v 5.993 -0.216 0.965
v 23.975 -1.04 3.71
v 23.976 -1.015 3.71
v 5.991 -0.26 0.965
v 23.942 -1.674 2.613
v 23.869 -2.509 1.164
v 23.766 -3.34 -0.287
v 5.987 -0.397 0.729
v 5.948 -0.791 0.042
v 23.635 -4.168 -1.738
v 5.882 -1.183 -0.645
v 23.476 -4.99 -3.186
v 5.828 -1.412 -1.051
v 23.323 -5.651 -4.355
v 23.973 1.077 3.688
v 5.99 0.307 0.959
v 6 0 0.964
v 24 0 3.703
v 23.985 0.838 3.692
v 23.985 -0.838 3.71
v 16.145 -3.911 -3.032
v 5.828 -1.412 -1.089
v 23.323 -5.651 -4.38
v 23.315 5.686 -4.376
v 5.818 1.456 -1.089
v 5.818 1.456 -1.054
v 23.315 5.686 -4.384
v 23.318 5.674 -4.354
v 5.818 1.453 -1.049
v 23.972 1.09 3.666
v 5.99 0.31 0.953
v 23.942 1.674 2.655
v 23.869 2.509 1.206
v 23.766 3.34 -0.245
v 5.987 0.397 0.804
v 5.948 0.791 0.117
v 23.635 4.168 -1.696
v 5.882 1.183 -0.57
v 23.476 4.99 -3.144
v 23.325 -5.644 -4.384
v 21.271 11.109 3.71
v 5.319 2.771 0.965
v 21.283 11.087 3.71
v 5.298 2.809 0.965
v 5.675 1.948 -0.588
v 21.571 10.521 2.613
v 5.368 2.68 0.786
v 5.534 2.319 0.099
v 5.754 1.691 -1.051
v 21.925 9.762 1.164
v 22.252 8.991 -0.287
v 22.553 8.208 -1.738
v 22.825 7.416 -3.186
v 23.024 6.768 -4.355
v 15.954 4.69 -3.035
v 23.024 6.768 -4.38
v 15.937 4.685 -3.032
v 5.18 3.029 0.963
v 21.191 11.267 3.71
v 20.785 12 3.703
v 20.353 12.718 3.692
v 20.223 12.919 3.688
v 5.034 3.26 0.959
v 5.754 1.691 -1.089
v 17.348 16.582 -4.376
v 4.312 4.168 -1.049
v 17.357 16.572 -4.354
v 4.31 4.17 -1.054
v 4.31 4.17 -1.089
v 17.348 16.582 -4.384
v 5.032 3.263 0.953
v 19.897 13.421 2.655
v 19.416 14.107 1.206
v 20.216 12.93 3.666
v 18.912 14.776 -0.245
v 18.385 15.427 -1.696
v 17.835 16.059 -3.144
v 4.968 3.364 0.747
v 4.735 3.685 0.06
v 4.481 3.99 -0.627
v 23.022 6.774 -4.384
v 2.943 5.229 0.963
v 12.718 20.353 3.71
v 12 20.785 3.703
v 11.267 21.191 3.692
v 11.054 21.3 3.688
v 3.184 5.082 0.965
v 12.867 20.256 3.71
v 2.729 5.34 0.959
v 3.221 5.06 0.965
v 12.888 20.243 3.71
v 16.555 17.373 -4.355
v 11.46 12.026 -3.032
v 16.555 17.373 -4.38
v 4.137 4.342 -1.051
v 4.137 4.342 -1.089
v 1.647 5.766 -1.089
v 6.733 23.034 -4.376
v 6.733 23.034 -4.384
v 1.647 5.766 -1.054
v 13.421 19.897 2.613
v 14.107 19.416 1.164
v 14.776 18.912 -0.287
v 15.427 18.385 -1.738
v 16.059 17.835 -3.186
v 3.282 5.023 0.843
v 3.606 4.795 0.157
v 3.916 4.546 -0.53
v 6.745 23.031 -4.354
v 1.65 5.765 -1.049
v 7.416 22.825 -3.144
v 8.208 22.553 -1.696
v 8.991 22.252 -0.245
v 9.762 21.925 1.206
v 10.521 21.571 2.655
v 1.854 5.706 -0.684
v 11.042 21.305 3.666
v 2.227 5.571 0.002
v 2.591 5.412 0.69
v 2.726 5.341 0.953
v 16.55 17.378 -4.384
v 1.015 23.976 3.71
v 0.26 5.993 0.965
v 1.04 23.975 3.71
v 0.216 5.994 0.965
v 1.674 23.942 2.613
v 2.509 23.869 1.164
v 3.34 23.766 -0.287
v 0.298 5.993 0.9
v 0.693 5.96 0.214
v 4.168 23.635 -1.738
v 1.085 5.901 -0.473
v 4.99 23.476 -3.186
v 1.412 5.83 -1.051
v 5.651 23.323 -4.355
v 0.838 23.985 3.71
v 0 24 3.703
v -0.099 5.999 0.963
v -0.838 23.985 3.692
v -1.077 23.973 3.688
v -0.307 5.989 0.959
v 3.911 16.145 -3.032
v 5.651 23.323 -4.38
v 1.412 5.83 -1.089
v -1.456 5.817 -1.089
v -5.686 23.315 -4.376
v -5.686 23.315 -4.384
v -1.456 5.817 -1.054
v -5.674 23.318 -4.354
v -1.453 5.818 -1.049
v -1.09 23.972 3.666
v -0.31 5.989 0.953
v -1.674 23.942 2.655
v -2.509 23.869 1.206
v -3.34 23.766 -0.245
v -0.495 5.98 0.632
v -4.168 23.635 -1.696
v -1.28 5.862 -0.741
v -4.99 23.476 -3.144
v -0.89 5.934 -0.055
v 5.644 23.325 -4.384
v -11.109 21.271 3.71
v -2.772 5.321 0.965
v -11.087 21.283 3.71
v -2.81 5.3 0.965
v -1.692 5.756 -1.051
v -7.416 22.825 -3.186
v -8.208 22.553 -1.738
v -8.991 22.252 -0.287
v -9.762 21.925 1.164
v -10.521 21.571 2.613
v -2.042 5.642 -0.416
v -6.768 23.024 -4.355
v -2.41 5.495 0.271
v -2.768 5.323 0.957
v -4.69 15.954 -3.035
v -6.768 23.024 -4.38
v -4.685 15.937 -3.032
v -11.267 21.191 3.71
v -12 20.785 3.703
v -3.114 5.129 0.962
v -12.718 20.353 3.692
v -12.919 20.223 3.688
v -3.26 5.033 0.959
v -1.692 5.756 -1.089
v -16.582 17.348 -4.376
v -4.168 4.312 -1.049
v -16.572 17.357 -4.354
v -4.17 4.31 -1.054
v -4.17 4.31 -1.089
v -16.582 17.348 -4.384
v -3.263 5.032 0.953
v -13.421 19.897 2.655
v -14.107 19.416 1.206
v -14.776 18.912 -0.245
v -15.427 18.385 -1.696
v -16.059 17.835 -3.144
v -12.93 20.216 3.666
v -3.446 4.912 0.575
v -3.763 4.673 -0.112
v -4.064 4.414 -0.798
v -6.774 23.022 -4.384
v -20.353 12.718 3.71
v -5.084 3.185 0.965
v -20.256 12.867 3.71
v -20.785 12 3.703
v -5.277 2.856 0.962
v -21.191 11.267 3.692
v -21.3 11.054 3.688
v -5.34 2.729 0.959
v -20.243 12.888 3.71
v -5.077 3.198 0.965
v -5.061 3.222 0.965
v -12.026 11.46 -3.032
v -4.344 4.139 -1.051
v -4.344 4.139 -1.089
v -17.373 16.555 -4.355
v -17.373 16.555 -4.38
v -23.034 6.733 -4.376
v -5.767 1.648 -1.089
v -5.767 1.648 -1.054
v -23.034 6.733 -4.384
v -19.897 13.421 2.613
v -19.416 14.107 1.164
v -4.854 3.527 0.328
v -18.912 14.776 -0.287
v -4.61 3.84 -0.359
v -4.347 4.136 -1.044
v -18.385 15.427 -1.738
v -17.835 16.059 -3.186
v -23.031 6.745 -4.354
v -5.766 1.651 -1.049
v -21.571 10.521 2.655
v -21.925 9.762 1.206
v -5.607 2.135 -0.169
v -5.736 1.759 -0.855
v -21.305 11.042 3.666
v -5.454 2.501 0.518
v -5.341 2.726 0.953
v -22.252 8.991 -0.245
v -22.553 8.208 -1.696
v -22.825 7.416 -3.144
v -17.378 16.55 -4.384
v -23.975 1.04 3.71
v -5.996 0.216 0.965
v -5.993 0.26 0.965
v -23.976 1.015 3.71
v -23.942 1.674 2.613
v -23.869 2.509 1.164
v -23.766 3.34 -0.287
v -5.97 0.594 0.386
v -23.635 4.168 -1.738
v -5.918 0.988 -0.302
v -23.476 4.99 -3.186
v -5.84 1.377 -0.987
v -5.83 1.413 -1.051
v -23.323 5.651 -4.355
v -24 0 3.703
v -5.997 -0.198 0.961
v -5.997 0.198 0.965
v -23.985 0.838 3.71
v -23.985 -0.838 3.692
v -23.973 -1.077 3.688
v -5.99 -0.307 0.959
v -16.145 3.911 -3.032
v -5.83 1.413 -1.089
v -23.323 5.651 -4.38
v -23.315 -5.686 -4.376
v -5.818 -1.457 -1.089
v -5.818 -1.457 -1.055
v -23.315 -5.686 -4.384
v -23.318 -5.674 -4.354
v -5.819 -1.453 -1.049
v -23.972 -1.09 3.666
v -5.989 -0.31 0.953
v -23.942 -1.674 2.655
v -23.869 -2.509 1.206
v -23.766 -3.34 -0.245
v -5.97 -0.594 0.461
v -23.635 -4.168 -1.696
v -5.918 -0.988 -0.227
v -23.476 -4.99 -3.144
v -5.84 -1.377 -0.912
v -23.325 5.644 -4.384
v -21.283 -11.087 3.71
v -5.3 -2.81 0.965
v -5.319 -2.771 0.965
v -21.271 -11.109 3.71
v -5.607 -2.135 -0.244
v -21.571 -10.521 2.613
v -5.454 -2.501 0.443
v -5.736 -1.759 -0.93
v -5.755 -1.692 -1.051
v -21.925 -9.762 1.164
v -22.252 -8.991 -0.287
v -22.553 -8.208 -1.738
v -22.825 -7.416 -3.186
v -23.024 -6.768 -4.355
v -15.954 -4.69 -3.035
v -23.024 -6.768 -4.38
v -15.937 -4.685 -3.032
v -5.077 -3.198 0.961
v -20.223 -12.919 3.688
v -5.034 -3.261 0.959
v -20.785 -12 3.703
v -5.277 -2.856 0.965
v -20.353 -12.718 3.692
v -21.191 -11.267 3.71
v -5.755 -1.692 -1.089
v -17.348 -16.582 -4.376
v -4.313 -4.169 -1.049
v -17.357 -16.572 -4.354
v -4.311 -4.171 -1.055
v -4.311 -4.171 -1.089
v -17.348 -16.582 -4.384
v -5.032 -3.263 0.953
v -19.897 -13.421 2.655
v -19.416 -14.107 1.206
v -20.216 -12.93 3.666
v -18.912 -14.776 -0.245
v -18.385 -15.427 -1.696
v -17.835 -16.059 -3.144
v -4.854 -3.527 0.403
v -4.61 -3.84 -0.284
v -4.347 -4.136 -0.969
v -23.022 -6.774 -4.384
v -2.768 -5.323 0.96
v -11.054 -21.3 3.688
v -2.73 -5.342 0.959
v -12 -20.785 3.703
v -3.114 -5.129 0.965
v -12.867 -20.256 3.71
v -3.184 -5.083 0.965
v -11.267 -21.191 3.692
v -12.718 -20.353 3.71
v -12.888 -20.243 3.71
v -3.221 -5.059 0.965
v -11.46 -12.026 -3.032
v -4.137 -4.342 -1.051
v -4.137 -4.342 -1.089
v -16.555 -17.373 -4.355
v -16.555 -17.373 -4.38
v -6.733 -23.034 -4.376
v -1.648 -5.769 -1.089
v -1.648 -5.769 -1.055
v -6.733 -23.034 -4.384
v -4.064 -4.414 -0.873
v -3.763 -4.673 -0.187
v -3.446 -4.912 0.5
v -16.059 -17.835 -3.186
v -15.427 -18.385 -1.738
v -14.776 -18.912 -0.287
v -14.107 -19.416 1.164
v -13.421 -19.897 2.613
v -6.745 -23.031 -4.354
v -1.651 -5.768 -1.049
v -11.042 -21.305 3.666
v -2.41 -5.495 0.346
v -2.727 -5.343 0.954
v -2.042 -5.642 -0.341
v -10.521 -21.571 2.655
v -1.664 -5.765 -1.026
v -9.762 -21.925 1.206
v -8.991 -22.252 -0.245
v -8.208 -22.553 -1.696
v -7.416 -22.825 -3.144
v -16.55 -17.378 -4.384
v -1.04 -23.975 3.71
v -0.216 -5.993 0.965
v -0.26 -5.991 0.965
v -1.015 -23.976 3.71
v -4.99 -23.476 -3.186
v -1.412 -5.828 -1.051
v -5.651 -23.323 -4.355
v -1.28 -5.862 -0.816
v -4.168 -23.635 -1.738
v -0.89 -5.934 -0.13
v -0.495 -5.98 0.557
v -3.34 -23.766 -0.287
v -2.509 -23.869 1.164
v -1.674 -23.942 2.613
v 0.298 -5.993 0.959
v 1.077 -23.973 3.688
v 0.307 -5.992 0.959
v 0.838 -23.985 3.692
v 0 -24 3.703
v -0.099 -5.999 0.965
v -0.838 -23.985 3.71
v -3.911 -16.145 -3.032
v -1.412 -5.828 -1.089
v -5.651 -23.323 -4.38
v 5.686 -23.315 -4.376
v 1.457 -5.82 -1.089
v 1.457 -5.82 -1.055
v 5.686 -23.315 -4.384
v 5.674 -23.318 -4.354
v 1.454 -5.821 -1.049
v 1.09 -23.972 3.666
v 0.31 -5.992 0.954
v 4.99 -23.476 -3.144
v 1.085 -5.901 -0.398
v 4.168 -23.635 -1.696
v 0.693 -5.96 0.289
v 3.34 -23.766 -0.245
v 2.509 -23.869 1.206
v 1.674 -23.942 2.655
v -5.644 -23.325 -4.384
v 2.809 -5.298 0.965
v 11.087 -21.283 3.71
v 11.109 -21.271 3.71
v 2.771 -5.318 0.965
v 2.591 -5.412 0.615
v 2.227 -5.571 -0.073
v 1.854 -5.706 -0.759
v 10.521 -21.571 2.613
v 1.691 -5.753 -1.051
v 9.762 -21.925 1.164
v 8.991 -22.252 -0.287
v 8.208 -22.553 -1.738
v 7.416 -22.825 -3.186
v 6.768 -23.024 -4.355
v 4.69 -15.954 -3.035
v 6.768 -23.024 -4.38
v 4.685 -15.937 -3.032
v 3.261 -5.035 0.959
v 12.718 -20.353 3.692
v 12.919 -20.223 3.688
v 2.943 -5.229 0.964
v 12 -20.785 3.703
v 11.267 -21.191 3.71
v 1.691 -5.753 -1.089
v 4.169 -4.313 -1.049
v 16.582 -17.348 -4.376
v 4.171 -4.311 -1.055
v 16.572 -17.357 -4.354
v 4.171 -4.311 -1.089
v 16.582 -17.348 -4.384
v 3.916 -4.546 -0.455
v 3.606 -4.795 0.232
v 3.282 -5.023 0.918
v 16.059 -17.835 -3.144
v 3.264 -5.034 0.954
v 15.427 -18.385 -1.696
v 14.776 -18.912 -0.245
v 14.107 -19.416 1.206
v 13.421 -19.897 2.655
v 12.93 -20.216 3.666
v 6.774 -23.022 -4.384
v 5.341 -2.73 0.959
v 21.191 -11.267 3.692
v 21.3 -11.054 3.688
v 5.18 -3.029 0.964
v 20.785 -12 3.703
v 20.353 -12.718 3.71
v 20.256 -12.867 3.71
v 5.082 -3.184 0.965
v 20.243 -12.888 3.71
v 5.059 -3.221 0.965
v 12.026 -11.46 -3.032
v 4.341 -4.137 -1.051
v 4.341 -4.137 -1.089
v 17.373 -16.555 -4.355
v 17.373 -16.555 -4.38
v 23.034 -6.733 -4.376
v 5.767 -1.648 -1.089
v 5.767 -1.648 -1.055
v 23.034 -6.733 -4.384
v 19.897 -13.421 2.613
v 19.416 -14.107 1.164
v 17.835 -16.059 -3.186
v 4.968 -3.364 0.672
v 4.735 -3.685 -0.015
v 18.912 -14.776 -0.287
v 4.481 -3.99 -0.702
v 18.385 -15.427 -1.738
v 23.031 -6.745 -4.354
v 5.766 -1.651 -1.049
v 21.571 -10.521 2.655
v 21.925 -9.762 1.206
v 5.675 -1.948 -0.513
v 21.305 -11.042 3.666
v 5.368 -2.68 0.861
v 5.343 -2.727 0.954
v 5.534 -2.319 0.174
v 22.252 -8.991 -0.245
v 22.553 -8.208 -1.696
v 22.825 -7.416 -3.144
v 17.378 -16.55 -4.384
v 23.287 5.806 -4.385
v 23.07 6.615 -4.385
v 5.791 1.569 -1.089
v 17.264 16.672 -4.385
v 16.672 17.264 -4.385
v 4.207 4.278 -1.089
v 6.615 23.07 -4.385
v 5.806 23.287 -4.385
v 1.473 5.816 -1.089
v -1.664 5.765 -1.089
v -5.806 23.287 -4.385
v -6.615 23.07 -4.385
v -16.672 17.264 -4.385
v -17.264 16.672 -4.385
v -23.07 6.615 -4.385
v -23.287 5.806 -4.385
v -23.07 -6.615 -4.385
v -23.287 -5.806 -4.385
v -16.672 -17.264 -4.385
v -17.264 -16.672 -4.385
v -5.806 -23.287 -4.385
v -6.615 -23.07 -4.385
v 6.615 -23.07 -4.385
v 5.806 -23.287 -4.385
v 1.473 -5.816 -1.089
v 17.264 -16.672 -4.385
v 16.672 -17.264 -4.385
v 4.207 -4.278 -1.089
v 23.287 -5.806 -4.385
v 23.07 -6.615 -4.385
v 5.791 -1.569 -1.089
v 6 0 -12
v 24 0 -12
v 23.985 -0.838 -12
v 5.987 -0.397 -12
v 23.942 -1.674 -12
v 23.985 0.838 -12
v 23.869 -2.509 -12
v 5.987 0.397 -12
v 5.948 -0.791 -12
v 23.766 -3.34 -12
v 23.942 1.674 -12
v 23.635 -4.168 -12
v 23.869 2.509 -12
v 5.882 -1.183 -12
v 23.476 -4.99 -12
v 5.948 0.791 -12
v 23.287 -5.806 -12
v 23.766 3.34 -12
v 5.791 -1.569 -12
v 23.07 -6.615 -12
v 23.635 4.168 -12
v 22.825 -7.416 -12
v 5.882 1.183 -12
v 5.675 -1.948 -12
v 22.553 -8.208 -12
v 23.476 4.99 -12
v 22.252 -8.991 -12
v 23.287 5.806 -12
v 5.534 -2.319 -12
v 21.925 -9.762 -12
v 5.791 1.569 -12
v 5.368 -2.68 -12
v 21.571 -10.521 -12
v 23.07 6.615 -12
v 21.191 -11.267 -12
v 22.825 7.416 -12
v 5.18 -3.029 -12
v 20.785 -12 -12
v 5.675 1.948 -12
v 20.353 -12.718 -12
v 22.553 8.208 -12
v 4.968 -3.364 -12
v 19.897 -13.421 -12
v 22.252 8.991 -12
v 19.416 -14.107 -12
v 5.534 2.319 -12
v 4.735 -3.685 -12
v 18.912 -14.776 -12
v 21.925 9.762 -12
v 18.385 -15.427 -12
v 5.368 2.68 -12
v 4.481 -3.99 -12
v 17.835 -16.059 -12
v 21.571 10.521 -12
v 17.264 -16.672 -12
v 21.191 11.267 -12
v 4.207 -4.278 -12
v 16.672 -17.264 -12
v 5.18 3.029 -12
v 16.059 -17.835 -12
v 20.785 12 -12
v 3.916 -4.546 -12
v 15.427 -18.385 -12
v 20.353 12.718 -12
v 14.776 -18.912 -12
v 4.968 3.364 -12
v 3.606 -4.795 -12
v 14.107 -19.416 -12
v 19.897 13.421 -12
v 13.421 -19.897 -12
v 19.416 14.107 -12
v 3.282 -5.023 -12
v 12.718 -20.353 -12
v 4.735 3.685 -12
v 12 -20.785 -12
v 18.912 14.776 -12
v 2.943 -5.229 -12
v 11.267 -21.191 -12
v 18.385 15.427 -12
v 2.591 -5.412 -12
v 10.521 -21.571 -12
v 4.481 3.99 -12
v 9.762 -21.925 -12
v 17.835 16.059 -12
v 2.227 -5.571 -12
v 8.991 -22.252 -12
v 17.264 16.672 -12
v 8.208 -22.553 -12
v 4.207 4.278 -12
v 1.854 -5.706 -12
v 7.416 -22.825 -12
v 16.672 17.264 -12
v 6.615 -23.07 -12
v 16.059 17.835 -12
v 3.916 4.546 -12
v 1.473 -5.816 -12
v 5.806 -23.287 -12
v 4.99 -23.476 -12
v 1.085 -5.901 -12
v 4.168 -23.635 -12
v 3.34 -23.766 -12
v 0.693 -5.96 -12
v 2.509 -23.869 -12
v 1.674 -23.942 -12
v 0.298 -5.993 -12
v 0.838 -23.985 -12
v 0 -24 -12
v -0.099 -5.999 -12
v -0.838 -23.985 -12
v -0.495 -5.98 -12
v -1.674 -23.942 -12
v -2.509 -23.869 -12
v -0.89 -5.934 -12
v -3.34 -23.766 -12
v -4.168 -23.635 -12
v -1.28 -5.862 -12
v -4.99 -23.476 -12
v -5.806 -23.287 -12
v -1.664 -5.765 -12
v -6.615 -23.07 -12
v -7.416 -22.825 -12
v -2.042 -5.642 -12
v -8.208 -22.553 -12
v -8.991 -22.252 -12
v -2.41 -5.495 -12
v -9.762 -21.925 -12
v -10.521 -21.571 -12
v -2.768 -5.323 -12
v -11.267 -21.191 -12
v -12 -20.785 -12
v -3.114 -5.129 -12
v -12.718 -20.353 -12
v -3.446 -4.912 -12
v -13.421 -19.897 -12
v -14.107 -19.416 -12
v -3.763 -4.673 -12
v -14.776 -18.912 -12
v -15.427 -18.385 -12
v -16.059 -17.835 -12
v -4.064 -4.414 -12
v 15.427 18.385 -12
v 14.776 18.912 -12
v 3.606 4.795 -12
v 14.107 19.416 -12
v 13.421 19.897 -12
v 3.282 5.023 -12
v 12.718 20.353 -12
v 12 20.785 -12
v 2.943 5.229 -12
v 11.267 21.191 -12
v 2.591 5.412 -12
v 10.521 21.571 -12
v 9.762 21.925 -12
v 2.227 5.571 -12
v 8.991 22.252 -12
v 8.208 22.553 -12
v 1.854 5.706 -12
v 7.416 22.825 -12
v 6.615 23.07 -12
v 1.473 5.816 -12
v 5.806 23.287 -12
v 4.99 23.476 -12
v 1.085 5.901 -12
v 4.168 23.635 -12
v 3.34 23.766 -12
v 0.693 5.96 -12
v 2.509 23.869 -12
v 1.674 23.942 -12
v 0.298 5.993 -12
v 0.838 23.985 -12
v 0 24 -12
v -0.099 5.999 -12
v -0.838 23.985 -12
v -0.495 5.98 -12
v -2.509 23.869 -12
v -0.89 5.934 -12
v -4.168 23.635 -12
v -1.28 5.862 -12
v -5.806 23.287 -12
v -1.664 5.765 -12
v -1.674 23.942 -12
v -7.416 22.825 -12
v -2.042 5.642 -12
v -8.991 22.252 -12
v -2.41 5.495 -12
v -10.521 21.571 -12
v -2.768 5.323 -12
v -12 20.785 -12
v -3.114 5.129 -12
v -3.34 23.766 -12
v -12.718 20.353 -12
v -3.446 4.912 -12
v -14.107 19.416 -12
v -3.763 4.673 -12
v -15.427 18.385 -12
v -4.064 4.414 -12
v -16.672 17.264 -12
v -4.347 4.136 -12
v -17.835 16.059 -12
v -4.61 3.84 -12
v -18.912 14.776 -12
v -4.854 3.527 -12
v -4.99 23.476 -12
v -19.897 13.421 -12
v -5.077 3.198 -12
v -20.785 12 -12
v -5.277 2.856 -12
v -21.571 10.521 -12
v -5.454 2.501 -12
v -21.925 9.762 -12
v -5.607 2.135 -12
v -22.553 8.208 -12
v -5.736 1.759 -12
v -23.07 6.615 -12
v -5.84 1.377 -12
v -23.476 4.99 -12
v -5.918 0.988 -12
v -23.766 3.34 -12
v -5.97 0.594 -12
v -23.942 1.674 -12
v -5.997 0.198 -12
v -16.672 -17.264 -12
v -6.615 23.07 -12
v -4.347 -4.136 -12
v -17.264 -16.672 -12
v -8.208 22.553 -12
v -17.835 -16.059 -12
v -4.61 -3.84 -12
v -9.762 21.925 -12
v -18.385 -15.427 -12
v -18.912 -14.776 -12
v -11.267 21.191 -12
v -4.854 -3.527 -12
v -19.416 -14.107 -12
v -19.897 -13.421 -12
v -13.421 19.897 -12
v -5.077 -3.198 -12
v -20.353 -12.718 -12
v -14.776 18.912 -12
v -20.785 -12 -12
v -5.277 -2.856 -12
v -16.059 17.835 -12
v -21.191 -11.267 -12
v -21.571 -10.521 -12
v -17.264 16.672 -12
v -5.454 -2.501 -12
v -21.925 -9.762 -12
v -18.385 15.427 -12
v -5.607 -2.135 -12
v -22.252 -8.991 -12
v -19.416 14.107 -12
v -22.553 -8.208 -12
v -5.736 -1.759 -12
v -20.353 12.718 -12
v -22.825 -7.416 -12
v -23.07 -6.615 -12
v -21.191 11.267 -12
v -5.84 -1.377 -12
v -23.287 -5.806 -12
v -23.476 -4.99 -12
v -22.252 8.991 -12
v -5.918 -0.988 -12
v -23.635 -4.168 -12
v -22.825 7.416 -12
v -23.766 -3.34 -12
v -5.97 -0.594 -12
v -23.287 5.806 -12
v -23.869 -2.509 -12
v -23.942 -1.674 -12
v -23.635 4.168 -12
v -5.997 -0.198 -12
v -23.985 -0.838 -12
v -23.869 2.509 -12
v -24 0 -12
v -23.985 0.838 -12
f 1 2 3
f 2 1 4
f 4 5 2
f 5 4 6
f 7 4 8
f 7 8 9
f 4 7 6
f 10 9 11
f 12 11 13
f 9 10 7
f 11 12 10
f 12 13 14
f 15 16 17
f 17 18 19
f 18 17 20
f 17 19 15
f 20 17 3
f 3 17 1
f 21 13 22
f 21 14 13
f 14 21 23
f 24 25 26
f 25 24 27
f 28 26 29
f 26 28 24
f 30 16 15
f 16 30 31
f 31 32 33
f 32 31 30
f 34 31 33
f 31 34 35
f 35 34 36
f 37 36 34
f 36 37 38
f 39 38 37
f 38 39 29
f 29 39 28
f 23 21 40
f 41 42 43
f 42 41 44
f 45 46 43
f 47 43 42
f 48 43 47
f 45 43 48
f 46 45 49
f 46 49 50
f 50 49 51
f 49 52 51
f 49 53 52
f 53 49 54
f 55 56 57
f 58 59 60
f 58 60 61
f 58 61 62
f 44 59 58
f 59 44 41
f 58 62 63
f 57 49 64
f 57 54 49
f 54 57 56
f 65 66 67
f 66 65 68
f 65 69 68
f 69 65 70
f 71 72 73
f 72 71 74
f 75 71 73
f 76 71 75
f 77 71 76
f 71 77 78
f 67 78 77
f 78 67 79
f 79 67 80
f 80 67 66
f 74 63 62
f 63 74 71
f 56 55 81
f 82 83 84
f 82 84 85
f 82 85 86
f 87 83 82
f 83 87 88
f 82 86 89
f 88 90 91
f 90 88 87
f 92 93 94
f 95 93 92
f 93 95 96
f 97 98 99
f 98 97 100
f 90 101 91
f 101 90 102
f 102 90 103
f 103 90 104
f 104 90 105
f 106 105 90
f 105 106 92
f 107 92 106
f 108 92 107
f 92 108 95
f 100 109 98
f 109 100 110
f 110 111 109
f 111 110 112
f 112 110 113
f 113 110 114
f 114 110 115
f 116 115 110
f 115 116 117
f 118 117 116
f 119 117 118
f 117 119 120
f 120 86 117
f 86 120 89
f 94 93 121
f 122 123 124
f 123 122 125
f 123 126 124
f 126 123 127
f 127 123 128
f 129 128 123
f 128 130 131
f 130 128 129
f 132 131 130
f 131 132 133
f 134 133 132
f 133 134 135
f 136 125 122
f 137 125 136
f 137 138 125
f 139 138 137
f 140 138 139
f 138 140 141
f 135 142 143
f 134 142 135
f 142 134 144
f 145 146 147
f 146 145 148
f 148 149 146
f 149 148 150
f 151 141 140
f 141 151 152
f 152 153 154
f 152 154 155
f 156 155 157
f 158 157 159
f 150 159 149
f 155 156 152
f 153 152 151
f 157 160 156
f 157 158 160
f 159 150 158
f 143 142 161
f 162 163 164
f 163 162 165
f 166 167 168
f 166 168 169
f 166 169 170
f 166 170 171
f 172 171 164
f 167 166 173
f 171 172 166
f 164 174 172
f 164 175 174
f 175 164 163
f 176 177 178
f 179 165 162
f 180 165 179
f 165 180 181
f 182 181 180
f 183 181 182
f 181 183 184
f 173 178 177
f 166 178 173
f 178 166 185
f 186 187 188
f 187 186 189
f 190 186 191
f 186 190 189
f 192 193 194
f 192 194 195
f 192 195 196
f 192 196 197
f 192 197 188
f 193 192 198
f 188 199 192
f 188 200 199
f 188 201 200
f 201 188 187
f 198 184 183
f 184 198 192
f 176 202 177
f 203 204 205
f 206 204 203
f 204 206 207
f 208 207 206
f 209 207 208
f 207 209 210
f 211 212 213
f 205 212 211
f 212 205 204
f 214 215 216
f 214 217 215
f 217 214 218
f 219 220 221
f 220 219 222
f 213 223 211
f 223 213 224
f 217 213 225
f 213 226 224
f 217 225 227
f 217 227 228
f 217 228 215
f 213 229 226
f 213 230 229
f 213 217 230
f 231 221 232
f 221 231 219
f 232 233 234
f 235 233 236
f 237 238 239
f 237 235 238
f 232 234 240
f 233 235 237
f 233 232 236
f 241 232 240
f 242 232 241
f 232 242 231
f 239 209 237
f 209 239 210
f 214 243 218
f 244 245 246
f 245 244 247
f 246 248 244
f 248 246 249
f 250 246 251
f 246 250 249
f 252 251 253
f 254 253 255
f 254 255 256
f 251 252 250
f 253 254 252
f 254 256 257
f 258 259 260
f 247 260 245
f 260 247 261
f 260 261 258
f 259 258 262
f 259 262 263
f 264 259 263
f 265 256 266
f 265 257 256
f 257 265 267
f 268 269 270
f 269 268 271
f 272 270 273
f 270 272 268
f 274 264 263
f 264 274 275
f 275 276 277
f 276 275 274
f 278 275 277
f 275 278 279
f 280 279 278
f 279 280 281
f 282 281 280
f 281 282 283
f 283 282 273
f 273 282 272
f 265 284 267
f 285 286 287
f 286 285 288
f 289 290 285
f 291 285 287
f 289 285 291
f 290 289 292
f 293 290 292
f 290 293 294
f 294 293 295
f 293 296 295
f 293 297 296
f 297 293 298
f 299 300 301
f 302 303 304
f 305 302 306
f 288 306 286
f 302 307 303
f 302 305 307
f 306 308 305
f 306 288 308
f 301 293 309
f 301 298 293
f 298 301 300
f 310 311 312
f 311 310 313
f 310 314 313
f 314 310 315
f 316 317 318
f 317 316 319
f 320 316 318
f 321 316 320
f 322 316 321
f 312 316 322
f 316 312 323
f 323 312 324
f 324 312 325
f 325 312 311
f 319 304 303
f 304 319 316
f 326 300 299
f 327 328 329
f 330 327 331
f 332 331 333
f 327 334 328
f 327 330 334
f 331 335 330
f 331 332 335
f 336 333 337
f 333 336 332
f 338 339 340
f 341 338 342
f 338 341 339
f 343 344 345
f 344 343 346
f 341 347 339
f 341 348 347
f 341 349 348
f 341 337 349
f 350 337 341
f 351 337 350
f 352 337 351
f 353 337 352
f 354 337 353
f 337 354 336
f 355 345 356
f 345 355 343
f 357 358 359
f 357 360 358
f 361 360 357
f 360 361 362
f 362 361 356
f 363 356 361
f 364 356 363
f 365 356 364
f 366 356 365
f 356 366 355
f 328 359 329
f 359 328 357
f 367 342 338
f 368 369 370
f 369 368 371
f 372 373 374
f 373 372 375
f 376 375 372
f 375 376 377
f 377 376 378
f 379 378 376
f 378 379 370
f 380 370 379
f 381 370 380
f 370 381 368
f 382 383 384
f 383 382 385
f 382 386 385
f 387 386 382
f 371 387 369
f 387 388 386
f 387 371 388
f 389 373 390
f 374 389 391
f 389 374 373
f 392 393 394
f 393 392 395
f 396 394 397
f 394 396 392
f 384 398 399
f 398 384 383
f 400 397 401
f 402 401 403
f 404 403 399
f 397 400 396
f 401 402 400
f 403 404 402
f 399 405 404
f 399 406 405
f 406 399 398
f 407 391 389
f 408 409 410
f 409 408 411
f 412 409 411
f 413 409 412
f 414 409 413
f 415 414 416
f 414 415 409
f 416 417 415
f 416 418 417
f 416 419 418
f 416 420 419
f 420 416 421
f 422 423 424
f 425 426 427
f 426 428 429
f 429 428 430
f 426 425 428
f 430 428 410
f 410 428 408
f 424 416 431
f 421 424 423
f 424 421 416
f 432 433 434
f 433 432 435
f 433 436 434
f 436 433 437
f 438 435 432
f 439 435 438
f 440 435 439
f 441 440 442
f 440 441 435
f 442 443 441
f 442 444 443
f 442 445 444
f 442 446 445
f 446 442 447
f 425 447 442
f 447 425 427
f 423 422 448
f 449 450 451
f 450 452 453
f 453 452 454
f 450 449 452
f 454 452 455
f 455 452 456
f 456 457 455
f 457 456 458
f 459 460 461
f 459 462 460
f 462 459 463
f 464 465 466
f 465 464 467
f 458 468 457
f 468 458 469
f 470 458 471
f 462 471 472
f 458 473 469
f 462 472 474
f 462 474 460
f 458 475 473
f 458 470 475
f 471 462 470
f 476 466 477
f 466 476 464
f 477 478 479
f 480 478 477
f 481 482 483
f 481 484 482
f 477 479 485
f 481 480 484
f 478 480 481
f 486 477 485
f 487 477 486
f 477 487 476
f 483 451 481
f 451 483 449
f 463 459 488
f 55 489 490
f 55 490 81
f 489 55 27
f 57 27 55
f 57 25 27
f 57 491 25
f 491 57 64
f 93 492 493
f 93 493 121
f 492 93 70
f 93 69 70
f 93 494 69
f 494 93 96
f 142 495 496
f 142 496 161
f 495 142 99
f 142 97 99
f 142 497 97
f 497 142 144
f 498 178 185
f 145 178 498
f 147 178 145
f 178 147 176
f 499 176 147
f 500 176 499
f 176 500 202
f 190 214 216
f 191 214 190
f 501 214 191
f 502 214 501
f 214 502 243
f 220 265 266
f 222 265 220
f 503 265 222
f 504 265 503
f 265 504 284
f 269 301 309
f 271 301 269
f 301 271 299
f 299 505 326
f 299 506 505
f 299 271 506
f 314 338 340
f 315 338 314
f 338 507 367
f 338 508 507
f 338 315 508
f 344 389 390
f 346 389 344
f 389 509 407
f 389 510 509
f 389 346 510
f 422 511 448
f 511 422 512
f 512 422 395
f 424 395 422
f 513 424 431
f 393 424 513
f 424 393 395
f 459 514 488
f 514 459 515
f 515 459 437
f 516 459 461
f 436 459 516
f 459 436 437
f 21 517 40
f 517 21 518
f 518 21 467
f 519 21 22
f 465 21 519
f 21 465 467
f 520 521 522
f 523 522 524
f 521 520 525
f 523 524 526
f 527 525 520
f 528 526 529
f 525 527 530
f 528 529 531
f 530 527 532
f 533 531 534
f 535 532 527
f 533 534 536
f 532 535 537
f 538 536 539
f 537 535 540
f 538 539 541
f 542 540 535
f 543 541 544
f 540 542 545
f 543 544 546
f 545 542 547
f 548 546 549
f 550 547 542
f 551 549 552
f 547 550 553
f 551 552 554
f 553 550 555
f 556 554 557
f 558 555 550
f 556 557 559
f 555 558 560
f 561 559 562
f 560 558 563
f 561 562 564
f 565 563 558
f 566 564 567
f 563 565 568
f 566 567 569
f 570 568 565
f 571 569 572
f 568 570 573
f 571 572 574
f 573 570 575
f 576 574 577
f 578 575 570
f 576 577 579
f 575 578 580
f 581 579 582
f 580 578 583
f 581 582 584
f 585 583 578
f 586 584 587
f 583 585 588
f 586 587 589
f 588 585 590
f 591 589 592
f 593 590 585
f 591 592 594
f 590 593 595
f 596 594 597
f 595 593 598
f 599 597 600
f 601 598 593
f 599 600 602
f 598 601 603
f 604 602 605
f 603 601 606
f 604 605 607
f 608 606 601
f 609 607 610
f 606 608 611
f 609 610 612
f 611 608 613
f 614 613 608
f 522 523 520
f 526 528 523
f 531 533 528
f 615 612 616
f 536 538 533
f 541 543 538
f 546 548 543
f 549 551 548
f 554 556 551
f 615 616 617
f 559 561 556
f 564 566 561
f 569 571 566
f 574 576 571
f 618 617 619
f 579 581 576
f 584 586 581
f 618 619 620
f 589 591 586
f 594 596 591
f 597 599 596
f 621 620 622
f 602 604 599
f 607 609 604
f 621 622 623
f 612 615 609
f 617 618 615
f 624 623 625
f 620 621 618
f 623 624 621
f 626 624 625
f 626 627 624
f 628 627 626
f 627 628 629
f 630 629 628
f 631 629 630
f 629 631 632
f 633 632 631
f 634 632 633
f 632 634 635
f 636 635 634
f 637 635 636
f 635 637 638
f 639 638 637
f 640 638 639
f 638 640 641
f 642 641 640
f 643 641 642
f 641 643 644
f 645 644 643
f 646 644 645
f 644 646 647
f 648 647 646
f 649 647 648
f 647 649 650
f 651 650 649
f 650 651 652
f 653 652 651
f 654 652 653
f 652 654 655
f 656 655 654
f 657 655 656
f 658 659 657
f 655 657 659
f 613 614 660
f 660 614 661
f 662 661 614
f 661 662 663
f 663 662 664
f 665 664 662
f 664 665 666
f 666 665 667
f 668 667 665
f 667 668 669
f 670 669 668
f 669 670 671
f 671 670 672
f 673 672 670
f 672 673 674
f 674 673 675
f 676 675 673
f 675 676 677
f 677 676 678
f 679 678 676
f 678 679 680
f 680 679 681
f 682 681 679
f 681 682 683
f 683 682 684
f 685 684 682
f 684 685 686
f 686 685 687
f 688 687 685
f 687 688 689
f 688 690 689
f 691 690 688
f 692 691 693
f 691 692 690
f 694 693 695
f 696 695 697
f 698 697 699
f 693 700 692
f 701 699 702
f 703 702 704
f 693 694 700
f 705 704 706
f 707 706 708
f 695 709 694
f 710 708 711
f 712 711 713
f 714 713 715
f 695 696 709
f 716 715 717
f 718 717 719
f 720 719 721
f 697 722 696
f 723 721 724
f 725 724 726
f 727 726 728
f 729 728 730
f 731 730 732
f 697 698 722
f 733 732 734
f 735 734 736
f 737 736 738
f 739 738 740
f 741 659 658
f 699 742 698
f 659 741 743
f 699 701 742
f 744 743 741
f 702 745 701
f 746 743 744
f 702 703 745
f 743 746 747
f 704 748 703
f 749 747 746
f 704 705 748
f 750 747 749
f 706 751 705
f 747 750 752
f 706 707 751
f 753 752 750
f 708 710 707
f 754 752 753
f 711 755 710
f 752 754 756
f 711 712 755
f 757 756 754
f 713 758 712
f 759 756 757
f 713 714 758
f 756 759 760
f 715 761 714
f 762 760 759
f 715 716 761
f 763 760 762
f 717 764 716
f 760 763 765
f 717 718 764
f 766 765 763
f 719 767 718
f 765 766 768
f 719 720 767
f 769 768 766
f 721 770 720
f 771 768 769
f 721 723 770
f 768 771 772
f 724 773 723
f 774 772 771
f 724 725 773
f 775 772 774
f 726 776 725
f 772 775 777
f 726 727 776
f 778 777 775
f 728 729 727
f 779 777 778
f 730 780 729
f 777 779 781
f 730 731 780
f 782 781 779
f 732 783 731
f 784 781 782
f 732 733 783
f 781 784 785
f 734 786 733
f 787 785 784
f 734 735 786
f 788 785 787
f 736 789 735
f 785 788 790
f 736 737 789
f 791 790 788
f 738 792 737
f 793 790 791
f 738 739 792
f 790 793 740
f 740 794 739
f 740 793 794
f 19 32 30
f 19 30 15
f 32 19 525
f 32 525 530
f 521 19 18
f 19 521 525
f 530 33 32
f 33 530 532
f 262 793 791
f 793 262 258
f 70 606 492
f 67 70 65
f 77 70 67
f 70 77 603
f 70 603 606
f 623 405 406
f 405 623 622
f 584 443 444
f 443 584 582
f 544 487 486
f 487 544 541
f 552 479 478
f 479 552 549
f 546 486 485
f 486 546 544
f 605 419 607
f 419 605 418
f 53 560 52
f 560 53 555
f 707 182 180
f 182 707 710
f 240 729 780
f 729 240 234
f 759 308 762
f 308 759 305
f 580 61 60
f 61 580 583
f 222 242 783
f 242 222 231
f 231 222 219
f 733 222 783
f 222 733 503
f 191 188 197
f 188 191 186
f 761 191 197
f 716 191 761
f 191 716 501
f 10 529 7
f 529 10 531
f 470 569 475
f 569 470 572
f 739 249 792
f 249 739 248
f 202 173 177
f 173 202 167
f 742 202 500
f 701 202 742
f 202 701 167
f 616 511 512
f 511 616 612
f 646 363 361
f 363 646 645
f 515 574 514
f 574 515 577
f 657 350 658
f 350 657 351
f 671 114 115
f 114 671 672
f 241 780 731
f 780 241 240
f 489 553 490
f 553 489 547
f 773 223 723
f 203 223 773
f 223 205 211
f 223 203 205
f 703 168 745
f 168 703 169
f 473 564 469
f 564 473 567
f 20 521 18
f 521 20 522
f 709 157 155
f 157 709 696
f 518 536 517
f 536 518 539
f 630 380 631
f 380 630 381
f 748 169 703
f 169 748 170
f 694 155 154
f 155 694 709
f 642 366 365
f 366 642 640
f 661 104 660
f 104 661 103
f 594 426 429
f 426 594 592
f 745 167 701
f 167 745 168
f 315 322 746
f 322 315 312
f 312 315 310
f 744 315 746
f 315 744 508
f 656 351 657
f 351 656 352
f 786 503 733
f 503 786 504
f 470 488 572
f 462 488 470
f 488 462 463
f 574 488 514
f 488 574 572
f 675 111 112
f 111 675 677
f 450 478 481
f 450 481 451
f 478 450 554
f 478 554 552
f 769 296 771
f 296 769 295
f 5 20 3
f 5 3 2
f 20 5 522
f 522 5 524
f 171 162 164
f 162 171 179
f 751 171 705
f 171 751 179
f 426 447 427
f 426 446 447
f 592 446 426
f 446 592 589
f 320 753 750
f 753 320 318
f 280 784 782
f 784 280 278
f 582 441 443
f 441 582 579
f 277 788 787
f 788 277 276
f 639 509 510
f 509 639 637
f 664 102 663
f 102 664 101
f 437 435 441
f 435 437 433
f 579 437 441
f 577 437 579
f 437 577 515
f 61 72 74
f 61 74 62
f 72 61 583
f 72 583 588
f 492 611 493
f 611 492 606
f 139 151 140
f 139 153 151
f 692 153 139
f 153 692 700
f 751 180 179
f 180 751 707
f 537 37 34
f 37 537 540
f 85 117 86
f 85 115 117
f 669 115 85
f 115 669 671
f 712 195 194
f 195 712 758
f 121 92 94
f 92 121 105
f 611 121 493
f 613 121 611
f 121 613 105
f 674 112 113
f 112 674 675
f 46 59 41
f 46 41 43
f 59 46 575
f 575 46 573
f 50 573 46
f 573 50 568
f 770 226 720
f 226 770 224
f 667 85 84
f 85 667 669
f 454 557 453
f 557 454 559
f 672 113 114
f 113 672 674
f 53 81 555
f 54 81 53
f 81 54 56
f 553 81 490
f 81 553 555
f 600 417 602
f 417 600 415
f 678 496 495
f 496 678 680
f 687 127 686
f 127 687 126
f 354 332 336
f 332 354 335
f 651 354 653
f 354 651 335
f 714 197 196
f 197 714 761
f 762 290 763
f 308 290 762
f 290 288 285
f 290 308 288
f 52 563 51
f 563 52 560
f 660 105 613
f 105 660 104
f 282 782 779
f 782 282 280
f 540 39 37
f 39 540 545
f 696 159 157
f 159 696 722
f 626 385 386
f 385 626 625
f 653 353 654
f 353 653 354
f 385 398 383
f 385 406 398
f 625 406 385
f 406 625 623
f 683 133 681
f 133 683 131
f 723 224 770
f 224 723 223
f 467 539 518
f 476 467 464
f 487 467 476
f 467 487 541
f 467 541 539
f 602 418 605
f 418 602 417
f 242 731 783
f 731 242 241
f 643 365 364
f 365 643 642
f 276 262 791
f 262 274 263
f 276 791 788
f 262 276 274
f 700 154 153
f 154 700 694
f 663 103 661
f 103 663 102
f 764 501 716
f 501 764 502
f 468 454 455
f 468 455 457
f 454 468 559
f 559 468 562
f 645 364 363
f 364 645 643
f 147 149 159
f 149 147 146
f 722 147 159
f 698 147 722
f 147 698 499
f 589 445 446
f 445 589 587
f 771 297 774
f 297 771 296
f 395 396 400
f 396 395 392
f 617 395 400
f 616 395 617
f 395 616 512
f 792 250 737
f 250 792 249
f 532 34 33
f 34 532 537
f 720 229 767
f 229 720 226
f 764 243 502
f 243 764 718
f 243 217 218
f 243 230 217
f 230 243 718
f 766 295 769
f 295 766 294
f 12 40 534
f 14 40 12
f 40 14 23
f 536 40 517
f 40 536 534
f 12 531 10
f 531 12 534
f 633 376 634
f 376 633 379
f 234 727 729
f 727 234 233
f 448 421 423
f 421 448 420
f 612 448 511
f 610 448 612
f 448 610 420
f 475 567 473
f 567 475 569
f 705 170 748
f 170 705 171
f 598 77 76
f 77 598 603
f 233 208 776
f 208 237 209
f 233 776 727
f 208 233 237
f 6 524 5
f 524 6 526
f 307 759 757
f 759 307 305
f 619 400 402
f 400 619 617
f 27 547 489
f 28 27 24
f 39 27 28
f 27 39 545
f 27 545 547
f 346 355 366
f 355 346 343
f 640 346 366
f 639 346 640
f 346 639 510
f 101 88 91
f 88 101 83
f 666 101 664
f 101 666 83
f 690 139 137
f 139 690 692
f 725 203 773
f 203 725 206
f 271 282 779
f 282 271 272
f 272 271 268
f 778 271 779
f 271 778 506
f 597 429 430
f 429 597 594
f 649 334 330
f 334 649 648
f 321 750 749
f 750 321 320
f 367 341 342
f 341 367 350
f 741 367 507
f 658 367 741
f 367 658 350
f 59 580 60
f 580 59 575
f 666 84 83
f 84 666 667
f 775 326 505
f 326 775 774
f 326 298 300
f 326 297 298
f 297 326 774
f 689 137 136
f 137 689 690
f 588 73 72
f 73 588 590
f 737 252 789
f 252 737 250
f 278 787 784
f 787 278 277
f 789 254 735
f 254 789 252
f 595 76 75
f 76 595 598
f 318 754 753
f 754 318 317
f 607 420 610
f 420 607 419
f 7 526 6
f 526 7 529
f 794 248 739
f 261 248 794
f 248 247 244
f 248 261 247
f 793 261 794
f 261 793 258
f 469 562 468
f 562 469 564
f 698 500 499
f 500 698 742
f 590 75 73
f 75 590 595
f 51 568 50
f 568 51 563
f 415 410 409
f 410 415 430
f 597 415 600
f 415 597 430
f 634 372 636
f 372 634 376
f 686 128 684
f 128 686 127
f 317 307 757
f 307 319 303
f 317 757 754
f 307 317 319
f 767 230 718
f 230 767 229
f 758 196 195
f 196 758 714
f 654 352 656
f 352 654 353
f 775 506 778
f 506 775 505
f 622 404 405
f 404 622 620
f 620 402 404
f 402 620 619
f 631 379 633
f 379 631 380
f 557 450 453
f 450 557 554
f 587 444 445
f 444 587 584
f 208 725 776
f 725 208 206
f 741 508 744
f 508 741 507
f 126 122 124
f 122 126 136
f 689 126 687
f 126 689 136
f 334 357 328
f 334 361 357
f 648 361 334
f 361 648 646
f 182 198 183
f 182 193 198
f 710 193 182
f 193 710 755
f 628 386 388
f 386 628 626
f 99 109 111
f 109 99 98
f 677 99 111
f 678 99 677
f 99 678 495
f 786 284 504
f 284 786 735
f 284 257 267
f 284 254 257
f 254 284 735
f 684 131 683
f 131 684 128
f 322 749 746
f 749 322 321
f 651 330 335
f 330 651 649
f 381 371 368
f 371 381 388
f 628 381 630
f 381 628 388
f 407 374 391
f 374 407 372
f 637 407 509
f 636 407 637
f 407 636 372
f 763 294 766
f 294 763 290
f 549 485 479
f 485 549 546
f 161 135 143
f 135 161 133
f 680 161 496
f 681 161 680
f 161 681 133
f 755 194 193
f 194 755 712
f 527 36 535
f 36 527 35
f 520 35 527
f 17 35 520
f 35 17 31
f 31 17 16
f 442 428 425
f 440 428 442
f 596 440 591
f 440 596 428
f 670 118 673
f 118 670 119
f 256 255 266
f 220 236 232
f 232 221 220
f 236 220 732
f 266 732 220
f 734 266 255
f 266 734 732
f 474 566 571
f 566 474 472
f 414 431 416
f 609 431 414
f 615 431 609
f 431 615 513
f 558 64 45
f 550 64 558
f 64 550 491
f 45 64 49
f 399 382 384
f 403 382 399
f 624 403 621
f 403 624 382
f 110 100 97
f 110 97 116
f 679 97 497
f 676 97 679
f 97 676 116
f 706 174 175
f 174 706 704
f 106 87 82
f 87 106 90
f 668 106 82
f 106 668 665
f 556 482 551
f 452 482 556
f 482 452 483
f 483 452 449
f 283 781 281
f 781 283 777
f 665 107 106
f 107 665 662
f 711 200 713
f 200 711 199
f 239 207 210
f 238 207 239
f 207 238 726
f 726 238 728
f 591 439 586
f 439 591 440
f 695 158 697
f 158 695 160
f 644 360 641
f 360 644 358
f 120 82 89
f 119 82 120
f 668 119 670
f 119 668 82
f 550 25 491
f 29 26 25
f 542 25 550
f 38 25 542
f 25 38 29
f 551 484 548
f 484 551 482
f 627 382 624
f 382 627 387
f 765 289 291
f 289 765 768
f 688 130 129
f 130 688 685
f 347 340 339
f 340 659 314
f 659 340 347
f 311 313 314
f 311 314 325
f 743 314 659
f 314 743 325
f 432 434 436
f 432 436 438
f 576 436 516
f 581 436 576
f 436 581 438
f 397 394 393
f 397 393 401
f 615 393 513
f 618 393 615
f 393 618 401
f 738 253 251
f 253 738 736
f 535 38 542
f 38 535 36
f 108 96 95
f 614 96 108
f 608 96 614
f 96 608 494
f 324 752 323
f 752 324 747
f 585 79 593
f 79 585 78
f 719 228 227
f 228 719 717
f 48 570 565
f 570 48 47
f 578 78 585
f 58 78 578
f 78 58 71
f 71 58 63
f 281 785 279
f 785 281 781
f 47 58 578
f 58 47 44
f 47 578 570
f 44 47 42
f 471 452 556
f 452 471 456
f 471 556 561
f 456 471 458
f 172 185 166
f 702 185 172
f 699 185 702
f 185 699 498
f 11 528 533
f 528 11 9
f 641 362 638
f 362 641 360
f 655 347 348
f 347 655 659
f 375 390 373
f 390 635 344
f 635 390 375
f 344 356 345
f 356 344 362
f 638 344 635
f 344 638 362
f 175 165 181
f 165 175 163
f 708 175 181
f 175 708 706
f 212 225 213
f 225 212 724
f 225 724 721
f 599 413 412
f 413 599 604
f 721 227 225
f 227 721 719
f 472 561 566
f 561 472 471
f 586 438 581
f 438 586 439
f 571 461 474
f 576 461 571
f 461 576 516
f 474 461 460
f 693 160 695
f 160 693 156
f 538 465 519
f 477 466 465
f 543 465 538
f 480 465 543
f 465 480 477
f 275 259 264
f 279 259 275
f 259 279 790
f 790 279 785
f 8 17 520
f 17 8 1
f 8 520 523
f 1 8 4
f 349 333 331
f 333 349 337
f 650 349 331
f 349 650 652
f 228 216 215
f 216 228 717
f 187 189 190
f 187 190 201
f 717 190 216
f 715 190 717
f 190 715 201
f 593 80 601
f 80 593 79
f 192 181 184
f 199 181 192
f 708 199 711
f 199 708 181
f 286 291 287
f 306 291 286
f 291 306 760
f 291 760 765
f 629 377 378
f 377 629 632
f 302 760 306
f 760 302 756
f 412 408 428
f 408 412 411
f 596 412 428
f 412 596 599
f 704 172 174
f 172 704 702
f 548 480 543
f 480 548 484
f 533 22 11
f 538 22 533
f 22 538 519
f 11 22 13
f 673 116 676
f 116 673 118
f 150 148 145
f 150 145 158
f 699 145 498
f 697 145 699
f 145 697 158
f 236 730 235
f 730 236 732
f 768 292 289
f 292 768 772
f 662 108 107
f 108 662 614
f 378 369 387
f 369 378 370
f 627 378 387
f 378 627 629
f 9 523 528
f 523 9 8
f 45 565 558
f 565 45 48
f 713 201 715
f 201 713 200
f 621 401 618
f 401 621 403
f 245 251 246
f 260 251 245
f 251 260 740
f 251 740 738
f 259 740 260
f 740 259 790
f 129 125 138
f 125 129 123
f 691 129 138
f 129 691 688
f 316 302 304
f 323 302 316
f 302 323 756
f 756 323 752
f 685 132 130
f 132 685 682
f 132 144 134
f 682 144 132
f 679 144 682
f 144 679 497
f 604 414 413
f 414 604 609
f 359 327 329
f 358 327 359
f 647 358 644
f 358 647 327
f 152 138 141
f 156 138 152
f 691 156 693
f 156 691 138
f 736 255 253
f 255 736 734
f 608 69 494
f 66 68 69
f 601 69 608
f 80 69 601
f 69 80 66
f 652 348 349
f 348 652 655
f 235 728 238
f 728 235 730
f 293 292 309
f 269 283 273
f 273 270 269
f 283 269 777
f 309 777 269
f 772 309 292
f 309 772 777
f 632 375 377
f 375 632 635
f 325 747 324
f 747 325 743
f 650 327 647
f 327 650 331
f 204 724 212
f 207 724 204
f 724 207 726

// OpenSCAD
/*
Author: Lukas M. Süss aka mechadense
License: LGPL-3.0
Description: A minimal function for generation of hirth joints.

This is more meant as a library.
Deliberately kept minimal.

Customizer is just meant as a quick preview of what can be done.
Note that there is no math for sanity checking of supplied parameters.

## Usage tipps:

```
use <Hirth.scad>
hirth
  ( n = 12
  , r = 24
  , zbase = 8
  , slant = 60 
  , a1up = 10
  , a1down = 12
  , cuttype = "cylindrical"
  , dbore = 12
  , acone = 0
  )
```

- Always keep down_angle bigger than up_angle or the roofs will hit the valleys.
- If you use ist as a cutter then increase r and decrease dbore compared to the counterpart such that the teeth will fit radially.
- For printing a hirth interface at the bottom of a FFF-3D-print one can avert the need for support material by cutting off half of the teeth. This still meshes with full teeth but not with cutoff teeth.

## Notes:

This is the third and so far most performant attempt.
It uses convex hulls to span volumes.

I found that the crux for hirth joints is to 
***operate in spherical rahther than in cylindrical coordinates***

## History of preceding attempts versions:

Elegant but inefficient & buggy (attempt two):
Intersections of approximated halfspaces
https://www.thingiverse.com/thing:397553

Earliest (attempt one):
Vertices and meshing:
https://www.thingiverse.com/thing:387292
*/


// TODO:  add more vertical height in demos
// Publish on thingiverse and github
// import into bearing model and continue



// ##################################
// ##################################
// https://customizer.makerbot.com/docs
// Customizer

/* [Global] */

// number of hirth teeth (>=2)
toot_number = 12;
// radius … use a bit bigger radius for cutters
r0 = 24;
// vertical distance from hirths center-point to bottom of support
z_base =12;
// slant angle of the hirth teeth
slant_angle = 60;
// rotation angle upwards (roughly correspods to tooth height)
up_angle = 10;
// rotation angle downwards (roughly correspods to tooth depth)
down_angle = 12;
// spherical is most natural choice but slowest
type_of_cutoff = "cylindrical"; // ["none","cylindrical","spherical"]
// hole diameter (0 means no more)
hole_diameter = 12;
// if not 0 then the complementariy interface needs the same cone angle but negative 
cone_angle = 0;

/* [Resolution] */

// minimal angle per "circle edge" 
$fa = 2;
// minimal length per "circle edge"
$fs = 0.4;

/* [Misc] */

cylcol = [0.9,0.9,0.9];
basecolor = "cyan";

// ##################################


customizer_demo();
//demoarray();

module customizer_demo()
{
hirth
  ( n = toot_number // >=2
  , r = r0 // use a bit bigger r for cutters
  , zbase = z_base // bottom depth of straight cylindrical support
  , slant = slant_angle // tooth slant angle 
  , a1up = up_angle // big circle rotation angle up (~tooth height)
  , a1down = down_angle // big circle rotation angle down (~tooth depth)
  , cuttype = type_of_cutoff // cylindrical,spherical,none
  , dbore = hole_diameter
  , acone = cone_angle
  );
}

// need to debug zbasedemo ...
module demoarray
  (nmax = 12
  ,rdemo = 18
  ,dist = 48, // way bigger for cuttype none
  ,zbasedemo_convex = 32
  ,zbasedemo_flat = 16
  ,zbasedemo_concave = 4
  ,aconedemo = 30
  ,cuttypedemo = "cylindrical"
  ,dboredemo = 12.6
  )
{
for(ndemo=[2:nmax])
  {
  i = ndemo-2;
  translate([0,dist*i,0])
    {
    translate([-1*dist,0,0])
    hirth
      ( n = ndemo
      , r = rdemo
      , zbase = zbasedemo_concave
      , slant = 60
      , a1up = 12 - ndemo/2 // just to get something reasonable
      , a1down = 14  - ndemo/2
      , cuttype = cuttypedemo
      , dbore = dboredemo
      , acone = -aconedemo
      );
    translate([0*dist,0,0])
    hirth
      ( n = ndemo
      , r = rdemo
      , zbase = zbasedemo_flat
      , slant = 60
      , a1up = 12 - ndemo/2 
      , a1down = 14 - ndemo/2
      , cuttype = cuttypedemo
      , dbore = 0
      , acone = 0
      );
    translate([+1*dist,0,0])
    hirth
      ( n = ndemo
      , r = rdemo
      , zbase = zbasedemo_convex
      , slant = 60
      , a1up = 12 - ndemo/2 
      , a1down = 14 - ndemo/2
      , cuttype = cuttypedemo
      , dbore = dboredemo
      , acone = +aconedemo
      ); 
    }
  }
}

// #####################################
// #####################################
// #####################################
// #####################################

module hirth
  ( n = 12 // >=2
  , r = 24 // use a bit bigger r for cutters
  , zbase = 8 // bottom depth of straight cylindrical support
  , slant = 60 // tooth slant angle 
  , a1up = 10 // big circle rotation angle up (~tooth height)
  , a1down = 12 // big circle rotation angle down (~tooth depth)
  , cuttype = "cylindrical" // cylindrical,spherical,none
  , dbore = 0 // diameter of center hole
  , acone = 0 // conicality
  , verbose = "false"
  , eps = 0.05
  )
{ 
  
  a2 = slant; // hirth plane tilt angle
  // a2 ideally as high (steep) as possible 
  // without causing parts to remain stuck together
  // after heavy compressive loading
  // if printlayers hooking together just barely sometimes is problemeatic
  // then stay below 70°

  angle = 360/n; // angle per full tooth period 
  a3 = angle/4; // angle per half addendum or dedendum

  // Note: rmax includes some overstand that can be cut off by 
  // choosing a cuttype parameter of "cylindrical" or "spherical"
  // cuttoff overstand factor of 2.0 was choosen to 
  // have no missing part artefacts even with just 2 teeth
  rmax = r*2/cos(acone);
  // the cos(acone) part takes care of a shrinking cylindrical radius for 
  // higher absolute values of acone  
  // making the factor bigger is bad since at some point it
  // overrides the specified baseheight
  

  // TODO -- how to calculate a1 for sharp teeth (no flat at tip)?
  // It may be that this is not analytically solvable ...

  // ###############################################
  // deriving the height of the dedenta of the teeth
  // basically manually multiplying rotation matrices
  // Math derivation. DO NOT REMOVE.
  // after first rotation around z axis
  // rmax * [cos(a1),sin(a1),0] 
  // after second rotation around x axis
  // rmax * [cos(a1), sin(a1), 0]
  // rmax * [cos(a1), sin(a1)*cos(a2)-0*sin(a2),sin(a1)*sin(a2)+0*cos(a2)]
  // rmax * [cos(a1), sin(a1)*cos(a2),sin(a1)*sin(a2)]
  // after third rotation around z axis again
  // rmax * [cos(a1)*cos(a3)-sin(a1)*cos(a2)*sin(a3),
  //         cos(a1)*sin(a3)+sin(a1)*cos(a2)*cos(a3),
  //         sin(a1)*sin(a2)]
  // last line gives z height of where the point finally ends up
  k0down = sin(a1down) * sin(a2);
  z0down = rmax * k0down; // see math derivation above
  a0down = asin(k0down);
  // analogously for the addenda (not checked, not in use)
  k0up = sin(a1up) * sin(a2);
  z0up = rmax * k0up; 
  a0up = asin(k0up);


  // ############## 
  // the following is relevant for:
  // -> permanent tooth suport sttructures
  // -> the conical case (acone>0 || acone<0)
  // final rotations in xy plane (used for conicality only)
  a4up = atan2
    (cos(a1up)*sin(a3)+sin(a1up)*cos(a2)*cos(a3)
    ,cos(a1up)*cos(a3)-sin(a1up)*cos(a2)*sin(a3));
  a4down = atan2
    (cos(a1down)*sin(a3)+sin(a1down)*cos(a2)*cos(a3)
    ,cos(a1down)*cos(a3)-sin(a1down)*cos(a2)*sin(a3));

  // finding z0cone for the conical case (reduced to 2D problem)
  // point is at: [sqrt(rmax^2-z0down^2),z0down]
  // rotating it further by the cone angle:
  // z0cone = [sin(acone),cos(acone)] · [sqrt(rmax^2-z0down^2),z0down] 
  // this gives:
  z0cone = sqrt(rmax*rmax - z0down*z0down) * sin(acone) + z0down * cos(acone);
  // Sanity check: acone==0 => z0cone == z0down FINE
  r0cone = sqrt(rmax*rmax - z0down*z0down) * cos(acone) - z0down * sin(acone);

  // #################### debugging section
  if(verbose) echo(z0cone=z0cone);
  if(verbose) echo(z0down=z0down);
  if(verbose) echo(a3=a3, "quater angle per tooth");
  // DEBUG plane
  //color("grey")translate([0,0,-z0down]) cylinder(r= 100,h=0.05);
  //color("grey")translate([0,0,-z0cone]) cylinder(r= 100,h=0.05);

  difference()
  {
    intersection()
    {
      union()
      {
        for(i=[0:n-1])
        {
          rotate(360/n*i,[0,0,1])
          color("red") hirthtooth(); 
        }
        if(z0cone>=0) // flat and convex case
        {
          // permanent support structure
          support(n);
          // straight cylindrical base
          hbase = zbase-z0cone;
          color(basecolor)
          translate([0,0,-zbase])
            cylinder(r=r0cone,h=hbase,center=false);
          
          // BELOW was a somewhat dangerous hack:
          // conical adapter section
          //scale([1,1,-1])
          //  cylinder(r1=0,r2=r0cone,h=z0cone);
        } 
        else // (z0cone<0) // concave case
        {
          difference()
          {
            // baseblock
            hbase = zbase-z0cone;
            color(basecolor)
            translate([0,0,-zbase])
              cylinder(r=r0cone,h=hbase,center=false);
            // cutting from the baseblock
            translate([0,0,2*eps])  support(n);
            // doesn't this make the construction obsolete? To Check ...
            
            // BELOW was a not working hack:            
            // conical cut
            //scale([1,1,-1])
            //translate([0,0,eps])
            //  cylinder(r1=0,r2=r0cone,h=-z0cone);     
          }
        }
      }
      // cutting it round
      if(cuttype == "spherical") sphere(r=r,$fn=24*4);
      if(cuttype == "cylindrical") 
        color(cylcol) cylinder(r=r,h=42*r,center=true); //**
      if(cuttype == "none") {} // leave the cutting to the lib user
      // hirth couplings work in spherical coordinates so ...
      // a cylinder mathematically less correct than sphere ...
      // but it is computationally less expensive
      // maybe make this optional
    }
    if(dbore!=0) color(cylcol) cylinder(r=dbore/2,h=1000,center=true);
  }
  
  module hirthtooth()
  {
    hull()
    { 
      spanner(); // the center
      
      // ################
      // upper tooth tips

      // make it conical
      rotate(-a4up,[0,0,1])      
      rotate(acone,[0,1,0])      
      rotate(+a4up,[0,0,1])
      //rotate(acone,[0,-1,0]) // < only approx correct for many small teeth
      // basic planar hirth
      rotate(-a3,[0,0,1]) // rotate x-y-plane crossing of big circle
      rotate(+a2,[1,0,0]) // tilt big circle 
      rotate(a1up,[0,0,1]) // big circle rotation angle
        translate([rmax,0,0]) spanner();

      // make it conical
      rotate(+a4up,[0,0,1])      
      rotate(acone,[0,1,0])      
      rotate(-a4up,[0,0,1])      
      // basic planar hirth
      rotate(+a3,[0,0,1]) // rotate x-y-plane crossing of big circle
      rotate(-a2,[1,0,0]) // tilt big circle 
      rotate(-a1up,[0,0,1]) // big circle rotation angle
        translate([rmax,0,0]) spanner();
      
      // #################
      // lower tooth bases

      // make it conical
      rotate(-a4down,[0,0,1])      
      rotate(acone,[0,1,0])      
      rotate(+a4down,[0,0,1])
      // basic planar hirth
      rotate(-a3,[0,0,1]) // rotate x-y-plane crossing of big circle
      rotate(+a2,[1,0,0]) // tilt big circle 
      rotate(-a1down,[0,0,1]) // big circle rotation angle
        translate([rmax,0,0]) spanner();

      // make it conical
      rotate(+a4down,[0,0,1])      
      rotate(acone,[0,1,0])      
      rotate(-a4down,[0,0,1])      
      // basic planar hirth      
      rotate(+a3,[0,0,1]) // rotate x-y-plane crossing of big circle
      rotate(-a2,[1,0,0]) // tilt big circle 
      rotate(+a1down,[0,0,1]) // big circle rotation angle
        translate([rmax,0,0]) spanner();
      
      // READ IN REVERSE:
      // rotate to move flank from tooth center to tooth side
      // rotate that move into the final flank-angle 
      // rotate an angle that will become an angle anong the flank later
      // shift spanner out to spanning radius
      
      // TODO 
      // how to extend this to allow for conical hirth joints
    }    
  }
  
  module support(n)
  {
    for(i=[0:n-1])
    {
      rotate(360/n*i,[0,0,1])
      {
        a4down_complement = ((360/n)-2*a4down)/2; // ISSUE why too wide here ???? 
        // support for tooth (addendum)
        union() // does not seem to help with artefacts
        {
          color("green") support_slice(a4down);
          //spacefiller for gap (dedendum) 
          color("blue")    
            rotate(360/(2*n),[0,0,1])
              support_slice(a4down_complement); // issues here
        }
      }
    }
  }

  module support_slice(a=1)
  {
    scale([1,1,-1])
    hull()
    {
      translate([0     ,0,0     ]) spanner();
      translate([0     ,0,z0cone]) spanner();
      rotate(-a,[0,0,1])
        translate([r0cone,0,z0cone]) spanner();
      rotate(+a,[0,0,1])
        translate([r0cone,0,z0cone]) spanner();
    }
  }

  module spanner() // minor hack
  { 
    cube(eps); // fewer vertices
    //rotate(90,[0,1,0])sphere(r=0.05,$fn=6); 
  }
  
}
